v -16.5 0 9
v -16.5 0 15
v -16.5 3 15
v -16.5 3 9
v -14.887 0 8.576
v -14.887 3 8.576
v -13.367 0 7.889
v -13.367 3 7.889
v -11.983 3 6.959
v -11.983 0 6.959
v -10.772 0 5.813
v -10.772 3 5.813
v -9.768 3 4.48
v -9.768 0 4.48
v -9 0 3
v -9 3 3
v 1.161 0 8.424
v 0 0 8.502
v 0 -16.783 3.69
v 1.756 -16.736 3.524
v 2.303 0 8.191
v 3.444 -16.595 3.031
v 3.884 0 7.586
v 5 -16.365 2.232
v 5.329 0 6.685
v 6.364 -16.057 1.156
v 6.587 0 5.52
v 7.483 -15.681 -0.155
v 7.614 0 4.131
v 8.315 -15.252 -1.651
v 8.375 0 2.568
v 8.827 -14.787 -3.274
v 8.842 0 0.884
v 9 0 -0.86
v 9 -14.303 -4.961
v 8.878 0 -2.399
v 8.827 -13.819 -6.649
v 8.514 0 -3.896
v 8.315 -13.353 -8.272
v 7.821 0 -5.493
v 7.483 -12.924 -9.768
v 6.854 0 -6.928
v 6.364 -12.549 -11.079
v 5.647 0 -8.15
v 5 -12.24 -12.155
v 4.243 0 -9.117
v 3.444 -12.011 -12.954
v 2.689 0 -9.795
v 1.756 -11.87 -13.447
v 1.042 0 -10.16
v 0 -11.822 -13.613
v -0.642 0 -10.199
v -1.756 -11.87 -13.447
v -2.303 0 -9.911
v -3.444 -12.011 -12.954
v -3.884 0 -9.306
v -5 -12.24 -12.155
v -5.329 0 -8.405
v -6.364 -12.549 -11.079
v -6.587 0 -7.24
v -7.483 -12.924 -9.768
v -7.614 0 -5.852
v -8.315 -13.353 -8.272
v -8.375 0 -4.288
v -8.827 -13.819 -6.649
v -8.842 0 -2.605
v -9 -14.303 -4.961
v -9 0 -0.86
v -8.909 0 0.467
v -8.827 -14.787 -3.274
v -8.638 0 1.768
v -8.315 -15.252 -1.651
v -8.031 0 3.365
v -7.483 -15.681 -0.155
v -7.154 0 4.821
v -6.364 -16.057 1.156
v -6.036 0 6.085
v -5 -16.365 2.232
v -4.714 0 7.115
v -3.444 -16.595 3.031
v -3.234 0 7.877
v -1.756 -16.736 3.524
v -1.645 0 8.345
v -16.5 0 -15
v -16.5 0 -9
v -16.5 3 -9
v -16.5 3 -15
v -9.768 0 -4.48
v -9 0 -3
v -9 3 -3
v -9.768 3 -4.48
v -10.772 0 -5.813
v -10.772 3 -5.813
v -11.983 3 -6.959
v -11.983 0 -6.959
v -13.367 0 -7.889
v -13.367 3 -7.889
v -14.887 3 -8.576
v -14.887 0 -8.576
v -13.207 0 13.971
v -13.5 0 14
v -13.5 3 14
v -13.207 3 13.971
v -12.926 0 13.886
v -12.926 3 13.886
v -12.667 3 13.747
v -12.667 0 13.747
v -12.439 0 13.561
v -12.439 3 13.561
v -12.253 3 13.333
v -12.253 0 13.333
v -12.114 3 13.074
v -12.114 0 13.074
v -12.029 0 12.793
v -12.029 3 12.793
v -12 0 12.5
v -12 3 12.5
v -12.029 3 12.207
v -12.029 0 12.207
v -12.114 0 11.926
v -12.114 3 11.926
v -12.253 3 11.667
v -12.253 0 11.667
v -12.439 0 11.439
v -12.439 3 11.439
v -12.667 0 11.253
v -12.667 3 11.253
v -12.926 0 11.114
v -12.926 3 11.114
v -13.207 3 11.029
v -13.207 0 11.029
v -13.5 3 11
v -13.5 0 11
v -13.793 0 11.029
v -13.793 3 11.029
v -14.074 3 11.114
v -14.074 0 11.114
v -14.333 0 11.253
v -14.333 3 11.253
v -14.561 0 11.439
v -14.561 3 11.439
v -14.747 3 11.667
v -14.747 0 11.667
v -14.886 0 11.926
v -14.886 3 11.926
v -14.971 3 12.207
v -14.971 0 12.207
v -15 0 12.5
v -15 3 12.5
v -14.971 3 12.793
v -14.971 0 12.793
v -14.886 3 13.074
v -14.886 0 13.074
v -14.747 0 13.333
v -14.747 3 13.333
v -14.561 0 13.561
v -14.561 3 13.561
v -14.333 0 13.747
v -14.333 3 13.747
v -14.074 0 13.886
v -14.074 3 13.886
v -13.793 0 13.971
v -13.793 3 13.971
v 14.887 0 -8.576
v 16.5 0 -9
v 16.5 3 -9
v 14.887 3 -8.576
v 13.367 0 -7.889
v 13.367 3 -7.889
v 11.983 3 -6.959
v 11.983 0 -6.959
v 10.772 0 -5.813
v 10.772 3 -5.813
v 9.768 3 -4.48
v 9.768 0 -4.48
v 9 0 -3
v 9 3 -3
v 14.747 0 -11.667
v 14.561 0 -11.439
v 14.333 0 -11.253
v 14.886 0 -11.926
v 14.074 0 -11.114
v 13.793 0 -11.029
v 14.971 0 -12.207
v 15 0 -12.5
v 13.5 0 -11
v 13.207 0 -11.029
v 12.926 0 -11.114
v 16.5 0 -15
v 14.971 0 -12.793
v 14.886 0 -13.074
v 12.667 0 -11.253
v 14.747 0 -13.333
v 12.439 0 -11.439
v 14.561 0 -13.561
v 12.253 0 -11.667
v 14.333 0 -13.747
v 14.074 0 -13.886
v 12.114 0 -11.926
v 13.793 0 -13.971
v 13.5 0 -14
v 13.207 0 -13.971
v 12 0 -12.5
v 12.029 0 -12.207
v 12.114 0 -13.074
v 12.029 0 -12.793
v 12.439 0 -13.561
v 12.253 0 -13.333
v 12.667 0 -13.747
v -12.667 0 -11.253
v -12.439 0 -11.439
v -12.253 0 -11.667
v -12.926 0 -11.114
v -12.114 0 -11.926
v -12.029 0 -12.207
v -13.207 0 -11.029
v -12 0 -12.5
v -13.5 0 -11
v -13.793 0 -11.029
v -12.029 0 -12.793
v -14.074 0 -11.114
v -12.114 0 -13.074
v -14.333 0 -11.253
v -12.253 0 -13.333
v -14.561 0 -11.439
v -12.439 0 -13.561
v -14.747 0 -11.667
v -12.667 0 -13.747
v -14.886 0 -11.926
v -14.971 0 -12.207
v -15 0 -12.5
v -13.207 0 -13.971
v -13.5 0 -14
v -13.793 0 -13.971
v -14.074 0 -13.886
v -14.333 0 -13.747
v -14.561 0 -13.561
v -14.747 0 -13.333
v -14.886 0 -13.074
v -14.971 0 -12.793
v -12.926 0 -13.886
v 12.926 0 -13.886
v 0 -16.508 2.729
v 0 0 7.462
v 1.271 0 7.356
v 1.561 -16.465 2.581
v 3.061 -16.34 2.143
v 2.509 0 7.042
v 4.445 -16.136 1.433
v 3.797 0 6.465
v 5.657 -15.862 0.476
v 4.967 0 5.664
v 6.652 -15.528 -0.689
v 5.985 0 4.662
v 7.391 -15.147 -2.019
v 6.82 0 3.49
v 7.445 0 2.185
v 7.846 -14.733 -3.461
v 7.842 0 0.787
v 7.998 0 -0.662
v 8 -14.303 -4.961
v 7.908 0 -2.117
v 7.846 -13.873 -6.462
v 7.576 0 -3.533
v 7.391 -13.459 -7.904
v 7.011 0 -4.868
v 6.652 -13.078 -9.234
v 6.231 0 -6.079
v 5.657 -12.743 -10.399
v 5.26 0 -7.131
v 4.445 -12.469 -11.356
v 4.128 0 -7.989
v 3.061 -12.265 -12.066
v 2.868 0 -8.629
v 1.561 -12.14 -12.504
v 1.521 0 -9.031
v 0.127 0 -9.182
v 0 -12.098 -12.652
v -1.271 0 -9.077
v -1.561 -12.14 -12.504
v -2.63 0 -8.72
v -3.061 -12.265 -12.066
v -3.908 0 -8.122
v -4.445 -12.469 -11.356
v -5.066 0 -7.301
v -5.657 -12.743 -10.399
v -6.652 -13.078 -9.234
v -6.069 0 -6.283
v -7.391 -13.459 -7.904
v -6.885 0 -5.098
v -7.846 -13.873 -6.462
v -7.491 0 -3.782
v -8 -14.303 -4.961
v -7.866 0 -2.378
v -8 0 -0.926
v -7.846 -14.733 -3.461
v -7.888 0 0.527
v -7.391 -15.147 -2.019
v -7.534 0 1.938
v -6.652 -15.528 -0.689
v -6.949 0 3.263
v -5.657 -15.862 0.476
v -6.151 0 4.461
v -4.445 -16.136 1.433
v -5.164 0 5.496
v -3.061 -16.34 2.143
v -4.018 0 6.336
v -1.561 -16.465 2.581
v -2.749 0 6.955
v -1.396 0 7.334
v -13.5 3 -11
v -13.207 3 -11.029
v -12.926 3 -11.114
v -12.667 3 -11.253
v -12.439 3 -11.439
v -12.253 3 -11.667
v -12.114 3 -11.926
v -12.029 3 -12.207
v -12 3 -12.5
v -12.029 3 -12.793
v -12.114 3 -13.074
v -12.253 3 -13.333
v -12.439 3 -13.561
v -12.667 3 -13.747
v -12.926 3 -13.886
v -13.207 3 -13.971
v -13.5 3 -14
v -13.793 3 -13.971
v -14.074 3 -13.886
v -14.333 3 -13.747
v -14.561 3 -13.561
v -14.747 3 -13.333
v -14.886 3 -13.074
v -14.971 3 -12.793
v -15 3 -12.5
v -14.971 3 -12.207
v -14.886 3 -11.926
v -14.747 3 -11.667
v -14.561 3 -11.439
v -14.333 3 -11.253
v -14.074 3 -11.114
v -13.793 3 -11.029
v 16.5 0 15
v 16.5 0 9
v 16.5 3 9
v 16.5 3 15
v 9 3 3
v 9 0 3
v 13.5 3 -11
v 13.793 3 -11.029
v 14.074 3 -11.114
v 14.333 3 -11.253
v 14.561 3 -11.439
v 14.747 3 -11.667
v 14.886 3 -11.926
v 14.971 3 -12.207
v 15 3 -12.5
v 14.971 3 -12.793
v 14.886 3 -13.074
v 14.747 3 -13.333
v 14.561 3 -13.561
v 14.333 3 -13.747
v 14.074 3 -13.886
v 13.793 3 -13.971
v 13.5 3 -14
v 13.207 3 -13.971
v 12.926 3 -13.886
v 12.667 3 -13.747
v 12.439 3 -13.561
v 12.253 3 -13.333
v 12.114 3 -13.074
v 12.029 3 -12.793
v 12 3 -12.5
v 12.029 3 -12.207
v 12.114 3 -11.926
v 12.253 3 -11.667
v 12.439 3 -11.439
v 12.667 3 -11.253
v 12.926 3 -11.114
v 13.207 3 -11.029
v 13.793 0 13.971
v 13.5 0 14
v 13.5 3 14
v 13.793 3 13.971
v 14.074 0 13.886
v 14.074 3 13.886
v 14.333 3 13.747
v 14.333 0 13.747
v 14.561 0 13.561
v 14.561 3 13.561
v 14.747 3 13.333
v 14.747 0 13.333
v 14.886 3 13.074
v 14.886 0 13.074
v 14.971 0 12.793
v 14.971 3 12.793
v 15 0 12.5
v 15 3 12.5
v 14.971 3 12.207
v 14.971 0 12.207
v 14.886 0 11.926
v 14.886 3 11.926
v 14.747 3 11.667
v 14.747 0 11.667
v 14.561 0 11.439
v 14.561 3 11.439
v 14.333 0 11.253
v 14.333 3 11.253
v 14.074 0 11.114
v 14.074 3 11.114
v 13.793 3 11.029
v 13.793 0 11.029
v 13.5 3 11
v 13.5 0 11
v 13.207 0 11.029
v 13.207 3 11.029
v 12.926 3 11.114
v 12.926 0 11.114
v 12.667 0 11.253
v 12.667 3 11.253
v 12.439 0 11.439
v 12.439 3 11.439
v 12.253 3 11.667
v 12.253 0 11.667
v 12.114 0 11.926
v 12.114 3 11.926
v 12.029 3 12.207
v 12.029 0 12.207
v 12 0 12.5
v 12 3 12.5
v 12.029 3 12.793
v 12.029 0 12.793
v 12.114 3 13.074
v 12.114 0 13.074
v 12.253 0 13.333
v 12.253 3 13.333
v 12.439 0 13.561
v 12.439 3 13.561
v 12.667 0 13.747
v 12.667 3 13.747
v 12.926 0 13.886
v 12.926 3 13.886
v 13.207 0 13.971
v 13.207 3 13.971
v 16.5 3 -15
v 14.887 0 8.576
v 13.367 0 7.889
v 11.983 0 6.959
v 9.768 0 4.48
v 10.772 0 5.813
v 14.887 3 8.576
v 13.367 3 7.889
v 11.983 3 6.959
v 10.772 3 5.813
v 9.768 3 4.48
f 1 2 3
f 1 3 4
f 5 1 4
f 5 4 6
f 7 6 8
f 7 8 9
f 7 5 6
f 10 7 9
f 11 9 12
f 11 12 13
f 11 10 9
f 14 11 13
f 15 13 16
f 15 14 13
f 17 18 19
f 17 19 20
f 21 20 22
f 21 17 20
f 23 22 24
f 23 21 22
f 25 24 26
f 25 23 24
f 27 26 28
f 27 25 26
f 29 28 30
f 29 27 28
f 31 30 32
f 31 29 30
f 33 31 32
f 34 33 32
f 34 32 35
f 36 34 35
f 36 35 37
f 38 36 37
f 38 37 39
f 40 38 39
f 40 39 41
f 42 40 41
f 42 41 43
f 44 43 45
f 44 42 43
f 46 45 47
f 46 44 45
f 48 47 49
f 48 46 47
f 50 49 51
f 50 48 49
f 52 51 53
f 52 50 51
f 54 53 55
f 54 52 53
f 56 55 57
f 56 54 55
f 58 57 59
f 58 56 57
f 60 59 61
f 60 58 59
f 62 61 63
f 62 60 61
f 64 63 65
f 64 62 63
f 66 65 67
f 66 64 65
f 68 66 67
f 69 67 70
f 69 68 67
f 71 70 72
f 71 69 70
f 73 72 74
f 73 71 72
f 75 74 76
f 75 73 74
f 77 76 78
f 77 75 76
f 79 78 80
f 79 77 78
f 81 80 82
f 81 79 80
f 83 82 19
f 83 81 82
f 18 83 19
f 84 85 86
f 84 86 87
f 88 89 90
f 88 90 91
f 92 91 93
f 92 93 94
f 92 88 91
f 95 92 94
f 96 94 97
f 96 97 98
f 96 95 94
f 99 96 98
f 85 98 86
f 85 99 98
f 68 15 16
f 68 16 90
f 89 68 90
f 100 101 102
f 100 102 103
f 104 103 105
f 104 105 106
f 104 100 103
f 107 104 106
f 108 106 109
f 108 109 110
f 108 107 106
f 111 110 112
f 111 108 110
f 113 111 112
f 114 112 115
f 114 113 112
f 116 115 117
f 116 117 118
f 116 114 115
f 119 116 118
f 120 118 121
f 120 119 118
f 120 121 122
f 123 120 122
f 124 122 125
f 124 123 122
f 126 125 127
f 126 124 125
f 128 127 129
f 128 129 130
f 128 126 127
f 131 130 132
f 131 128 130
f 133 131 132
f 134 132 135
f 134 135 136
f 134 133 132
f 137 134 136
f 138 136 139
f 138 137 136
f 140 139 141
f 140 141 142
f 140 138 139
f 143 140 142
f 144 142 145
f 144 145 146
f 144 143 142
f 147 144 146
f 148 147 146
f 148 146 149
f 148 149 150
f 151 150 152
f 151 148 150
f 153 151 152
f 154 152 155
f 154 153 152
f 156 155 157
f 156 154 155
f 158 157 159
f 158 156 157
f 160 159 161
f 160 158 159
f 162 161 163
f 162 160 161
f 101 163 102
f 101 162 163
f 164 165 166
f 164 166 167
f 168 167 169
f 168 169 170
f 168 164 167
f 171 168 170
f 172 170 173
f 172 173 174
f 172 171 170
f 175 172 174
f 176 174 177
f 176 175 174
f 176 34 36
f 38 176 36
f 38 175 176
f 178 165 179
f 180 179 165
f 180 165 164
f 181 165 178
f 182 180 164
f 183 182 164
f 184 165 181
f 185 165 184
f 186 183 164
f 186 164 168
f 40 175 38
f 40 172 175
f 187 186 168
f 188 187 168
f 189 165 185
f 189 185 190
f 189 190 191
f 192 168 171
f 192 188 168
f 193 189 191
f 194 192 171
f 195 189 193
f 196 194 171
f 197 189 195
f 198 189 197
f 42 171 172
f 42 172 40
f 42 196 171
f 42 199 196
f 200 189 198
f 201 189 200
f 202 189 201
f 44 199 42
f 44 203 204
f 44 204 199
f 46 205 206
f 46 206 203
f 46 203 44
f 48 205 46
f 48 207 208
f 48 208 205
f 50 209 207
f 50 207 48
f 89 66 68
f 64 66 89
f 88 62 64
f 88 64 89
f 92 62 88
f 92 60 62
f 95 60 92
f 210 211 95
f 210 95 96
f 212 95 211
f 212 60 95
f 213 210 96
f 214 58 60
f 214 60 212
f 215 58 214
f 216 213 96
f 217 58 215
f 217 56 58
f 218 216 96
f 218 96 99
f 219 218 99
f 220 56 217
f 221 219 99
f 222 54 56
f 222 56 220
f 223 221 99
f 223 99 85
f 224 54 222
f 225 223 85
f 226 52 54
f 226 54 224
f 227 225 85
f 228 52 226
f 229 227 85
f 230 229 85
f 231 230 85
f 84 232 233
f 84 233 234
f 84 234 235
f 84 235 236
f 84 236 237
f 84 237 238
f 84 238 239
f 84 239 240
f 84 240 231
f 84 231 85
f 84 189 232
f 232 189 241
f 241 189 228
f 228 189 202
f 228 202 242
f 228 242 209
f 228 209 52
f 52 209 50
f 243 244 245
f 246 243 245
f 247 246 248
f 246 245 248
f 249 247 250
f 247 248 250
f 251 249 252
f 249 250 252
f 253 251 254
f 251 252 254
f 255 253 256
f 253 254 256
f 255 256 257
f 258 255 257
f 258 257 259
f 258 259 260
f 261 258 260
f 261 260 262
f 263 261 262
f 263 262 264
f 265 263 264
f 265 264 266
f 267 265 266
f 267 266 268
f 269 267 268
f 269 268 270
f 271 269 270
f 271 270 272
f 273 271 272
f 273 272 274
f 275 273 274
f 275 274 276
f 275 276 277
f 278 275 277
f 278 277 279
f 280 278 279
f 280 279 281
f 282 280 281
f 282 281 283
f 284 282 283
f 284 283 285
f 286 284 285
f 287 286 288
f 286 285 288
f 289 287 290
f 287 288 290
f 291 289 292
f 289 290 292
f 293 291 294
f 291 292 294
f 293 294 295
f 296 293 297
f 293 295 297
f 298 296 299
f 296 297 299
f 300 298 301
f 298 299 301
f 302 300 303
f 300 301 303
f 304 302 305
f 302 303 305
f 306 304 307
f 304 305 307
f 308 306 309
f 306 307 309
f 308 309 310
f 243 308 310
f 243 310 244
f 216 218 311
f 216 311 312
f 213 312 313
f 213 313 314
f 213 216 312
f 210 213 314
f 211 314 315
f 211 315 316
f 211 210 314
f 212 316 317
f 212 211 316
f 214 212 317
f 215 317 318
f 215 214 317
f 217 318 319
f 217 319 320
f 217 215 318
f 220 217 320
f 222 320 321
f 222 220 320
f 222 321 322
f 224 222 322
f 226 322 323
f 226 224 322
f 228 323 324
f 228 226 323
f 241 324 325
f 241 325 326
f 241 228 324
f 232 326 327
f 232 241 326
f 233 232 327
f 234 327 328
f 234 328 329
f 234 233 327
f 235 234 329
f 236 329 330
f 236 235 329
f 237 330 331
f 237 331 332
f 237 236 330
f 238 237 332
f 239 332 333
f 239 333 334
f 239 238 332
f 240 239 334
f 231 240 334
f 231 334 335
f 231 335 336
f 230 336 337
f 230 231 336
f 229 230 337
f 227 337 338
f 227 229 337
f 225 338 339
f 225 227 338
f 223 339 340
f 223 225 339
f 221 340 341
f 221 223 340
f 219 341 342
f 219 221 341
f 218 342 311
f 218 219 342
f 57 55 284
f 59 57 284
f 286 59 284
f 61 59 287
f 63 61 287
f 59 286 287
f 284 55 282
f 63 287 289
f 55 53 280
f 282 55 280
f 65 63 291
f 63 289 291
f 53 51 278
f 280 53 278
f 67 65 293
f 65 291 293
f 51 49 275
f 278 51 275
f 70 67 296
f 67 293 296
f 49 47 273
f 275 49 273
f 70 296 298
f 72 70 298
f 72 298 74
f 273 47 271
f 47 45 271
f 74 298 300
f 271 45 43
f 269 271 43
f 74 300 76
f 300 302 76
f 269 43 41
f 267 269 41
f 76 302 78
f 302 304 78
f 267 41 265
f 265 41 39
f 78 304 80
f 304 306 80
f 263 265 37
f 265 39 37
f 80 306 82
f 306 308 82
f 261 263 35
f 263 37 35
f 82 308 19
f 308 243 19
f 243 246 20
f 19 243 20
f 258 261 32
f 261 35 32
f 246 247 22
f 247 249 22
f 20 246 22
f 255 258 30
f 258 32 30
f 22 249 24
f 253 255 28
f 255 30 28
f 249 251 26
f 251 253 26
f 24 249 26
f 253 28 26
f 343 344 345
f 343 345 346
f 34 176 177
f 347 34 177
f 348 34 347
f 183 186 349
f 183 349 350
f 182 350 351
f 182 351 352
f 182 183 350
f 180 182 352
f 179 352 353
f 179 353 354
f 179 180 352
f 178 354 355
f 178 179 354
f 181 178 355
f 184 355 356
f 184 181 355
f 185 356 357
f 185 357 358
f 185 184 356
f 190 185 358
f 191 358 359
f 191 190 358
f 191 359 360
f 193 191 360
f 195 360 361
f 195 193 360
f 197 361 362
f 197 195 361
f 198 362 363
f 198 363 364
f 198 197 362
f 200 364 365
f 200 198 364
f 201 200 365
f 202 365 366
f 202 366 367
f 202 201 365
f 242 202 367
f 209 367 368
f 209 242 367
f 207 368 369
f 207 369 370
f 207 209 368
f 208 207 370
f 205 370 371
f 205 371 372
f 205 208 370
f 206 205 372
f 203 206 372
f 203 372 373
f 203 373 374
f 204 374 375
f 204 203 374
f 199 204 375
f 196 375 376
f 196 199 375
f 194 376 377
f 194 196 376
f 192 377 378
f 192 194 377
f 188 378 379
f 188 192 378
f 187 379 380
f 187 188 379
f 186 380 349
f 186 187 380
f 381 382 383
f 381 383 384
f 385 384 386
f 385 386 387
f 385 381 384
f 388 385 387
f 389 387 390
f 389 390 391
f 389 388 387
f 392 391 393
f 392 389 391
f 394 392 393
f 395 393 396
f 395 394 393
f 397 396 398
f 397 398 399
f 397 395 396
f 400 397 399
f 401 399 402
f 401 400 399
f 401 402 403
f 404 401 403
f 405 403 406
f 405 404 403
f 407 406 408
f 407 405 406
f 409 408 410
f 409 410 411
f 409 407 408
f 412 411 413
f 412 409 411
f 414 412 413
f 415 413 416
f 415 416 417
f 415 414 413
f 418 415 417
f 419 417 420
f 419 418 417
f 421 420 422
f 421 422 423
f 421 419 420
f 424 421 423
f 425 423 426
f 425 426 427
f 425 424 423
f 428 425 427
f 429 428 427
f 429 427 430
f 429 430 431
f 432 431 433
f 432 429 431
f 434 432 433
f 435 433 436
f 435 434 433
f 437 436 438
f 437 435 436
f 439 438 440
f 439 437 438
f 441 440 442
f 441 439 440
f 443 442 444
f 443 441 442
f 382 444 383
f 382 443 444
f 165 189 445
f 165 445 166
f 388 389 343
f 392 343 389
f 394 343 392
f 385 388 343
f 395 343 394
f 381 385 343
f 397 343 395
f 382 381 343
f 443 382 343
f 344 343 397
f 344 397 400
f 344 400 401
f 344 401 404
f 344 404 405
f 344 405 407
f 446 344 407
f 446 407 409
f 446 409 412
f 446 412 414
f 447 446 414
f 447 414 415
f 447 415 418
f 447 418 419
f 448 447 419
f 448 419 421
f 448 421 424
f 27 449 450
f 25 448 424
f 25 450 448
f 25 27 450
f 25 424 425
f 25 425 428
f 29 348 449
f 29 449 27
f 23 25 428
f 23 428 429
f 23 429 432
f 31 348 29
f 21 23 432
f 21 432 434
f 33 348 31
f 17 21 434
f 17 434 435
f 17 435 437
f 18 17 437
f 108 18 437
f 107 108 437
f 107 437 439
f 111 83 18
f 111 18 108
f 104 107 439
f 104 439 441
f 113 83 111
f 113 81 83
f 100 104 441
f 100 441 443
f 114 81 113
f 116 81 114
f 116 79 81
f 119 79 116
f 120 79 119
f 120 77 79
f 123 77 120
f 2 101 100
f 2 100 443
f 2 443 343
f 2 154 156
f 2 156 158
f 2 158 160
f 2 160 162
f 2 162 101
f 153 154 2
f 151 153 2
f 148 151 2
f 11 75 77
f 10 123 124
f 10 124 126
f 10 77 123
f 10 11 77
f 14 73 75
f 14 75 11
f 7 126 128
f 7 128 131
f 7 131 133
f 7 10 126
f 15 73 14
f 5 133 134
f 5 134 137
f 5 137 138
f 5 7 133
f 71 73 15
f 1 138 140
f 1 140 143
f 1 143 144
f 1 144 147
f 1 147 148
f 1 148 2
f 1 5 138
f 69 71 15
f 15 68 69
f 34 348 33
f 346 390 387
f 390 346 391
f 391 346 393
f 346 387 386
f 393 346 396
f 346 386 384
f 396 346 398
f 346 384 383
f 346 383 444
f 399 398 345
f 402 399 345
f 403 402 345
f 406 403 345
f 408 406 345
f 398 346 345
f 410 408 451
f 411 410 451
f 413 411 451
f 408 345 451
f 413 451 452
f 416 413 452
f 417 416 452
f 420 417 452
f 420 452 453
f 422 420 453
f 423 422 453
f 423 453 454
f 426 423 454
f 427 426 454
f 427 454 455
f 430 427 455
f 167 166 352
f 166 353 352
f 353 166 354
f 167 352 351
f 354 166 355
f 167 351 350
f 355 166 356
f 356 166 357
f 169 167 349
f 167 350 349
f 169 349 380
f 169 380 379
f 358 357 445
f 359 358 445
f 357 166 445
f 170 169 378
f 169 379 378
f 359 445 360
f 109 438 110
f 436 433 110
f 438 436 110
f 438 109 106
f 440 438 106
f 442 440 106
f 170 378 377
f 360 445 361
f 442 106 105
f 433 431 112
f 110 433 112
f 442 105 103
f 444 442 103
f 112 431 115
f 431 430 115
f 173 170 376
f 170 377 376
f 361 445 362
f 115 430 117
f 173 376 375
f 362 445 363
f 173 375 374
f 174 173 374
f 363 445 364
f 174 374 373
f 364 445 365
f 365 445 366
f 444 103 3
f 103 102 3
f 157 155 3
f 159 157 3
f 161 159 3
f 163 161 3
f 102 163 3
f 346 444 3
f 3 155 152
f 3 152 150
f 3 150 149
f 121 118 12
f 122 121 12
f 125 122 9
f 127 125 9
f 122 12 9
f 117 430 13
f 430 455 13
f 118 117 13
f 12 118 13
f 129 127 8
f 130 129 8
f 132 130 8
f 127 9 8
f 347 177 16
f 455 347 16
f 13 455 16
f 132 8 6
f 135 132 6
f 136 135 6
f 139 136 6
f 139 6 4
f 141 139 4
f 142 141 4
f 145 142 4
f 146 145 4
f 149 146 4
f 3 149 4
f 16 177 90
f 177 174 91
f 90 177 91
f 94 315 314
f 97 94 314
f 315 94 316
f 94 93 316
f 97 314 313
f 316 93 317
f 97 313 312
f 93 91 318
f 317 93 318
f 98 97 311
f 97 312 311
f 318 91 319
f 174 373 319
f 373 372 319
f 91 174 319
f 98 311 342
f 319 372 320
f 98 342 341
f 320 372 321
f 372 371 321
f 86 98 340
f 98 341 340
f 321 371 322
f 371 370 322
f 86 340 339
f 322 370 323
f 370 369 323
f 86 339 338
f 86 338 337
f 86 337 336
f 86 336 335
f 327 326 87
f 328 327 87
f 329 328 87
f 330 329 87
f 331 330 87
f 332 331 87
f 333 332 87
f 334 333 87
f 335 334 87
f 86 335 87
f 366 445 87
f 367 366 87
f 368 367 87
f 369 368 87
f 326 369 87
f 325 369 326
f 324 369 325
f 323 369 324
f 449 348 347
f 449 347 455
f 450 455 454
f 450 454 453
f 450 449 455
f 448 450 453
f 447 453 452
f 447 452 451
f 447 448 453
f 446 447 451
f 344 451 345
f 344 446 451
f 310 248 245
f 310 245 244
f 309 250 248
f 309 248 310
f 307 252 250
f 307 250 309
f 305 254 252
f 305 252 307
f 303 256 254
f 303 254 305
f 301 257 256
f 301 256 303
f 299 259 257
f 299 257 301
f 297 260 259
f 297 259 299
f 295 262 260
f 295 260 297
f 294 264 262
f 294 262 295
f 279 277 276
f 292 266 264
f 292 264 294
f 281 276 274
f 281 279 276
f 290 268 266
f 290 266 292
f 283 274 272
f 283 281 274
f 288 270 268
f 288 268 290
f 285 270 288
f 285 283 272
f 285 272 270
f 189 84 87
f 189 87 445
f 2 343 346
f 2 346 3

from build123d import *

# Parameters (mm, degrees)
SKETCH_1_R          = 1.5
EXTRUDE_1_DEPTH     = 3
SKETCH_3_R          = 9
SKETCH_3_R_2        = 8
EXTRUDE_2_DEPTH     = 18
SKETCH_4_W          = 18
SKETCH_4_H          = 2.480736202
CUT_EXTRUDE_1_DEPTH = 30


with BuildPart() as part:
    # 草图1 → 凸台-拉伸1 (new body)
    with BuildSketch(Plane(origin=(0, 0, 0), x_dir=(1, 0, 0), z_dir=(0, 1, 0))):
        with BuildLine():
            Line((-16.5, 15), (16.5, 15))
            Line((16.5, 15), (16.5, 9))
            ThreePointArc((16.5, 9), (11.982501162, 6.959373548), (9, 3))
            Line((9, 3), (9, -3))
            ThreePointArc((9, -3), (11.982501162, -6.959373548), (16.5, -9))
            Line((16.5, -9), (16.5, -15))
            Line((16.5, -15), (-16.5, -15))
            Line((-16.5, -15), (-16.5, -9))
            ThreePointArc((-16.5, -9), (-11.982501162, -6.959373548), (-9, -3))
            Line((-9, -3), (-9, 3))
            ThreePointArc((-9, 3), (-11.982501162, 6.959373548), (-16.5, 9))
            Line((-16.5, 9), (-16.5, 15))
        make_face()
        with Locations(Location((-13.5, 12.5, 0), (0, 0, 270))):
            Circle(SKETCH_1_R, mode=Mode.SUBTRACT)
        with Locations(Location((13.5, 12.5, 0), (0, 0, 270))):
            Circle(SKETCH_1_R, mode=Mode.SUBTRACT)
        with Locations(Location((13.5, -12.5, 0), (0, 0, 270))):
            Circle(SKETCH_1_R, mode=Mode.SUBTRACT)
        with Locations(Location((-13.5, -12.5, 0), (0, 0, 270))):
            Circle(SKETCH_1_R, mode=Mode.SUBTRACT)
    extrude(amount=EXTRUDE_1_DEPTH)

    # 草图3 → 凸台-拉伸2 (add)
    with BuildSketch(Plane(origin=(0, 2.772072144, 0.794878896), x_dir=(1, 0, 0), z_dir=(0, 0.9612616959383188, 0.27563735581699983))):
        with Locations(Location((0, 0.826912067, 0), (0, 0, 270))):
            Circle(SKETCH_3_R)
        with Locations(Location((0, 0.826912067, 0), (0, 0, 270))):
            Circle(SKETCH_3_R_2, mode=Mode.SUBTRACT)
    extrude(amount=-EXTRUDE_2_DEPTH)

    # 草图4 → 切除-拉伸1 (cut)
    with BuildSketch(Plane.XY.offset(15)):
        with Locations((0, 4.240368101)):
            Rectangle(SKETCH_4_W, SKETCH_4_H)
    extrude(amount=-CUT_EXTRUDE_1_DEPTH, mode=Mode.SUBTRACT)


solid = part.part
